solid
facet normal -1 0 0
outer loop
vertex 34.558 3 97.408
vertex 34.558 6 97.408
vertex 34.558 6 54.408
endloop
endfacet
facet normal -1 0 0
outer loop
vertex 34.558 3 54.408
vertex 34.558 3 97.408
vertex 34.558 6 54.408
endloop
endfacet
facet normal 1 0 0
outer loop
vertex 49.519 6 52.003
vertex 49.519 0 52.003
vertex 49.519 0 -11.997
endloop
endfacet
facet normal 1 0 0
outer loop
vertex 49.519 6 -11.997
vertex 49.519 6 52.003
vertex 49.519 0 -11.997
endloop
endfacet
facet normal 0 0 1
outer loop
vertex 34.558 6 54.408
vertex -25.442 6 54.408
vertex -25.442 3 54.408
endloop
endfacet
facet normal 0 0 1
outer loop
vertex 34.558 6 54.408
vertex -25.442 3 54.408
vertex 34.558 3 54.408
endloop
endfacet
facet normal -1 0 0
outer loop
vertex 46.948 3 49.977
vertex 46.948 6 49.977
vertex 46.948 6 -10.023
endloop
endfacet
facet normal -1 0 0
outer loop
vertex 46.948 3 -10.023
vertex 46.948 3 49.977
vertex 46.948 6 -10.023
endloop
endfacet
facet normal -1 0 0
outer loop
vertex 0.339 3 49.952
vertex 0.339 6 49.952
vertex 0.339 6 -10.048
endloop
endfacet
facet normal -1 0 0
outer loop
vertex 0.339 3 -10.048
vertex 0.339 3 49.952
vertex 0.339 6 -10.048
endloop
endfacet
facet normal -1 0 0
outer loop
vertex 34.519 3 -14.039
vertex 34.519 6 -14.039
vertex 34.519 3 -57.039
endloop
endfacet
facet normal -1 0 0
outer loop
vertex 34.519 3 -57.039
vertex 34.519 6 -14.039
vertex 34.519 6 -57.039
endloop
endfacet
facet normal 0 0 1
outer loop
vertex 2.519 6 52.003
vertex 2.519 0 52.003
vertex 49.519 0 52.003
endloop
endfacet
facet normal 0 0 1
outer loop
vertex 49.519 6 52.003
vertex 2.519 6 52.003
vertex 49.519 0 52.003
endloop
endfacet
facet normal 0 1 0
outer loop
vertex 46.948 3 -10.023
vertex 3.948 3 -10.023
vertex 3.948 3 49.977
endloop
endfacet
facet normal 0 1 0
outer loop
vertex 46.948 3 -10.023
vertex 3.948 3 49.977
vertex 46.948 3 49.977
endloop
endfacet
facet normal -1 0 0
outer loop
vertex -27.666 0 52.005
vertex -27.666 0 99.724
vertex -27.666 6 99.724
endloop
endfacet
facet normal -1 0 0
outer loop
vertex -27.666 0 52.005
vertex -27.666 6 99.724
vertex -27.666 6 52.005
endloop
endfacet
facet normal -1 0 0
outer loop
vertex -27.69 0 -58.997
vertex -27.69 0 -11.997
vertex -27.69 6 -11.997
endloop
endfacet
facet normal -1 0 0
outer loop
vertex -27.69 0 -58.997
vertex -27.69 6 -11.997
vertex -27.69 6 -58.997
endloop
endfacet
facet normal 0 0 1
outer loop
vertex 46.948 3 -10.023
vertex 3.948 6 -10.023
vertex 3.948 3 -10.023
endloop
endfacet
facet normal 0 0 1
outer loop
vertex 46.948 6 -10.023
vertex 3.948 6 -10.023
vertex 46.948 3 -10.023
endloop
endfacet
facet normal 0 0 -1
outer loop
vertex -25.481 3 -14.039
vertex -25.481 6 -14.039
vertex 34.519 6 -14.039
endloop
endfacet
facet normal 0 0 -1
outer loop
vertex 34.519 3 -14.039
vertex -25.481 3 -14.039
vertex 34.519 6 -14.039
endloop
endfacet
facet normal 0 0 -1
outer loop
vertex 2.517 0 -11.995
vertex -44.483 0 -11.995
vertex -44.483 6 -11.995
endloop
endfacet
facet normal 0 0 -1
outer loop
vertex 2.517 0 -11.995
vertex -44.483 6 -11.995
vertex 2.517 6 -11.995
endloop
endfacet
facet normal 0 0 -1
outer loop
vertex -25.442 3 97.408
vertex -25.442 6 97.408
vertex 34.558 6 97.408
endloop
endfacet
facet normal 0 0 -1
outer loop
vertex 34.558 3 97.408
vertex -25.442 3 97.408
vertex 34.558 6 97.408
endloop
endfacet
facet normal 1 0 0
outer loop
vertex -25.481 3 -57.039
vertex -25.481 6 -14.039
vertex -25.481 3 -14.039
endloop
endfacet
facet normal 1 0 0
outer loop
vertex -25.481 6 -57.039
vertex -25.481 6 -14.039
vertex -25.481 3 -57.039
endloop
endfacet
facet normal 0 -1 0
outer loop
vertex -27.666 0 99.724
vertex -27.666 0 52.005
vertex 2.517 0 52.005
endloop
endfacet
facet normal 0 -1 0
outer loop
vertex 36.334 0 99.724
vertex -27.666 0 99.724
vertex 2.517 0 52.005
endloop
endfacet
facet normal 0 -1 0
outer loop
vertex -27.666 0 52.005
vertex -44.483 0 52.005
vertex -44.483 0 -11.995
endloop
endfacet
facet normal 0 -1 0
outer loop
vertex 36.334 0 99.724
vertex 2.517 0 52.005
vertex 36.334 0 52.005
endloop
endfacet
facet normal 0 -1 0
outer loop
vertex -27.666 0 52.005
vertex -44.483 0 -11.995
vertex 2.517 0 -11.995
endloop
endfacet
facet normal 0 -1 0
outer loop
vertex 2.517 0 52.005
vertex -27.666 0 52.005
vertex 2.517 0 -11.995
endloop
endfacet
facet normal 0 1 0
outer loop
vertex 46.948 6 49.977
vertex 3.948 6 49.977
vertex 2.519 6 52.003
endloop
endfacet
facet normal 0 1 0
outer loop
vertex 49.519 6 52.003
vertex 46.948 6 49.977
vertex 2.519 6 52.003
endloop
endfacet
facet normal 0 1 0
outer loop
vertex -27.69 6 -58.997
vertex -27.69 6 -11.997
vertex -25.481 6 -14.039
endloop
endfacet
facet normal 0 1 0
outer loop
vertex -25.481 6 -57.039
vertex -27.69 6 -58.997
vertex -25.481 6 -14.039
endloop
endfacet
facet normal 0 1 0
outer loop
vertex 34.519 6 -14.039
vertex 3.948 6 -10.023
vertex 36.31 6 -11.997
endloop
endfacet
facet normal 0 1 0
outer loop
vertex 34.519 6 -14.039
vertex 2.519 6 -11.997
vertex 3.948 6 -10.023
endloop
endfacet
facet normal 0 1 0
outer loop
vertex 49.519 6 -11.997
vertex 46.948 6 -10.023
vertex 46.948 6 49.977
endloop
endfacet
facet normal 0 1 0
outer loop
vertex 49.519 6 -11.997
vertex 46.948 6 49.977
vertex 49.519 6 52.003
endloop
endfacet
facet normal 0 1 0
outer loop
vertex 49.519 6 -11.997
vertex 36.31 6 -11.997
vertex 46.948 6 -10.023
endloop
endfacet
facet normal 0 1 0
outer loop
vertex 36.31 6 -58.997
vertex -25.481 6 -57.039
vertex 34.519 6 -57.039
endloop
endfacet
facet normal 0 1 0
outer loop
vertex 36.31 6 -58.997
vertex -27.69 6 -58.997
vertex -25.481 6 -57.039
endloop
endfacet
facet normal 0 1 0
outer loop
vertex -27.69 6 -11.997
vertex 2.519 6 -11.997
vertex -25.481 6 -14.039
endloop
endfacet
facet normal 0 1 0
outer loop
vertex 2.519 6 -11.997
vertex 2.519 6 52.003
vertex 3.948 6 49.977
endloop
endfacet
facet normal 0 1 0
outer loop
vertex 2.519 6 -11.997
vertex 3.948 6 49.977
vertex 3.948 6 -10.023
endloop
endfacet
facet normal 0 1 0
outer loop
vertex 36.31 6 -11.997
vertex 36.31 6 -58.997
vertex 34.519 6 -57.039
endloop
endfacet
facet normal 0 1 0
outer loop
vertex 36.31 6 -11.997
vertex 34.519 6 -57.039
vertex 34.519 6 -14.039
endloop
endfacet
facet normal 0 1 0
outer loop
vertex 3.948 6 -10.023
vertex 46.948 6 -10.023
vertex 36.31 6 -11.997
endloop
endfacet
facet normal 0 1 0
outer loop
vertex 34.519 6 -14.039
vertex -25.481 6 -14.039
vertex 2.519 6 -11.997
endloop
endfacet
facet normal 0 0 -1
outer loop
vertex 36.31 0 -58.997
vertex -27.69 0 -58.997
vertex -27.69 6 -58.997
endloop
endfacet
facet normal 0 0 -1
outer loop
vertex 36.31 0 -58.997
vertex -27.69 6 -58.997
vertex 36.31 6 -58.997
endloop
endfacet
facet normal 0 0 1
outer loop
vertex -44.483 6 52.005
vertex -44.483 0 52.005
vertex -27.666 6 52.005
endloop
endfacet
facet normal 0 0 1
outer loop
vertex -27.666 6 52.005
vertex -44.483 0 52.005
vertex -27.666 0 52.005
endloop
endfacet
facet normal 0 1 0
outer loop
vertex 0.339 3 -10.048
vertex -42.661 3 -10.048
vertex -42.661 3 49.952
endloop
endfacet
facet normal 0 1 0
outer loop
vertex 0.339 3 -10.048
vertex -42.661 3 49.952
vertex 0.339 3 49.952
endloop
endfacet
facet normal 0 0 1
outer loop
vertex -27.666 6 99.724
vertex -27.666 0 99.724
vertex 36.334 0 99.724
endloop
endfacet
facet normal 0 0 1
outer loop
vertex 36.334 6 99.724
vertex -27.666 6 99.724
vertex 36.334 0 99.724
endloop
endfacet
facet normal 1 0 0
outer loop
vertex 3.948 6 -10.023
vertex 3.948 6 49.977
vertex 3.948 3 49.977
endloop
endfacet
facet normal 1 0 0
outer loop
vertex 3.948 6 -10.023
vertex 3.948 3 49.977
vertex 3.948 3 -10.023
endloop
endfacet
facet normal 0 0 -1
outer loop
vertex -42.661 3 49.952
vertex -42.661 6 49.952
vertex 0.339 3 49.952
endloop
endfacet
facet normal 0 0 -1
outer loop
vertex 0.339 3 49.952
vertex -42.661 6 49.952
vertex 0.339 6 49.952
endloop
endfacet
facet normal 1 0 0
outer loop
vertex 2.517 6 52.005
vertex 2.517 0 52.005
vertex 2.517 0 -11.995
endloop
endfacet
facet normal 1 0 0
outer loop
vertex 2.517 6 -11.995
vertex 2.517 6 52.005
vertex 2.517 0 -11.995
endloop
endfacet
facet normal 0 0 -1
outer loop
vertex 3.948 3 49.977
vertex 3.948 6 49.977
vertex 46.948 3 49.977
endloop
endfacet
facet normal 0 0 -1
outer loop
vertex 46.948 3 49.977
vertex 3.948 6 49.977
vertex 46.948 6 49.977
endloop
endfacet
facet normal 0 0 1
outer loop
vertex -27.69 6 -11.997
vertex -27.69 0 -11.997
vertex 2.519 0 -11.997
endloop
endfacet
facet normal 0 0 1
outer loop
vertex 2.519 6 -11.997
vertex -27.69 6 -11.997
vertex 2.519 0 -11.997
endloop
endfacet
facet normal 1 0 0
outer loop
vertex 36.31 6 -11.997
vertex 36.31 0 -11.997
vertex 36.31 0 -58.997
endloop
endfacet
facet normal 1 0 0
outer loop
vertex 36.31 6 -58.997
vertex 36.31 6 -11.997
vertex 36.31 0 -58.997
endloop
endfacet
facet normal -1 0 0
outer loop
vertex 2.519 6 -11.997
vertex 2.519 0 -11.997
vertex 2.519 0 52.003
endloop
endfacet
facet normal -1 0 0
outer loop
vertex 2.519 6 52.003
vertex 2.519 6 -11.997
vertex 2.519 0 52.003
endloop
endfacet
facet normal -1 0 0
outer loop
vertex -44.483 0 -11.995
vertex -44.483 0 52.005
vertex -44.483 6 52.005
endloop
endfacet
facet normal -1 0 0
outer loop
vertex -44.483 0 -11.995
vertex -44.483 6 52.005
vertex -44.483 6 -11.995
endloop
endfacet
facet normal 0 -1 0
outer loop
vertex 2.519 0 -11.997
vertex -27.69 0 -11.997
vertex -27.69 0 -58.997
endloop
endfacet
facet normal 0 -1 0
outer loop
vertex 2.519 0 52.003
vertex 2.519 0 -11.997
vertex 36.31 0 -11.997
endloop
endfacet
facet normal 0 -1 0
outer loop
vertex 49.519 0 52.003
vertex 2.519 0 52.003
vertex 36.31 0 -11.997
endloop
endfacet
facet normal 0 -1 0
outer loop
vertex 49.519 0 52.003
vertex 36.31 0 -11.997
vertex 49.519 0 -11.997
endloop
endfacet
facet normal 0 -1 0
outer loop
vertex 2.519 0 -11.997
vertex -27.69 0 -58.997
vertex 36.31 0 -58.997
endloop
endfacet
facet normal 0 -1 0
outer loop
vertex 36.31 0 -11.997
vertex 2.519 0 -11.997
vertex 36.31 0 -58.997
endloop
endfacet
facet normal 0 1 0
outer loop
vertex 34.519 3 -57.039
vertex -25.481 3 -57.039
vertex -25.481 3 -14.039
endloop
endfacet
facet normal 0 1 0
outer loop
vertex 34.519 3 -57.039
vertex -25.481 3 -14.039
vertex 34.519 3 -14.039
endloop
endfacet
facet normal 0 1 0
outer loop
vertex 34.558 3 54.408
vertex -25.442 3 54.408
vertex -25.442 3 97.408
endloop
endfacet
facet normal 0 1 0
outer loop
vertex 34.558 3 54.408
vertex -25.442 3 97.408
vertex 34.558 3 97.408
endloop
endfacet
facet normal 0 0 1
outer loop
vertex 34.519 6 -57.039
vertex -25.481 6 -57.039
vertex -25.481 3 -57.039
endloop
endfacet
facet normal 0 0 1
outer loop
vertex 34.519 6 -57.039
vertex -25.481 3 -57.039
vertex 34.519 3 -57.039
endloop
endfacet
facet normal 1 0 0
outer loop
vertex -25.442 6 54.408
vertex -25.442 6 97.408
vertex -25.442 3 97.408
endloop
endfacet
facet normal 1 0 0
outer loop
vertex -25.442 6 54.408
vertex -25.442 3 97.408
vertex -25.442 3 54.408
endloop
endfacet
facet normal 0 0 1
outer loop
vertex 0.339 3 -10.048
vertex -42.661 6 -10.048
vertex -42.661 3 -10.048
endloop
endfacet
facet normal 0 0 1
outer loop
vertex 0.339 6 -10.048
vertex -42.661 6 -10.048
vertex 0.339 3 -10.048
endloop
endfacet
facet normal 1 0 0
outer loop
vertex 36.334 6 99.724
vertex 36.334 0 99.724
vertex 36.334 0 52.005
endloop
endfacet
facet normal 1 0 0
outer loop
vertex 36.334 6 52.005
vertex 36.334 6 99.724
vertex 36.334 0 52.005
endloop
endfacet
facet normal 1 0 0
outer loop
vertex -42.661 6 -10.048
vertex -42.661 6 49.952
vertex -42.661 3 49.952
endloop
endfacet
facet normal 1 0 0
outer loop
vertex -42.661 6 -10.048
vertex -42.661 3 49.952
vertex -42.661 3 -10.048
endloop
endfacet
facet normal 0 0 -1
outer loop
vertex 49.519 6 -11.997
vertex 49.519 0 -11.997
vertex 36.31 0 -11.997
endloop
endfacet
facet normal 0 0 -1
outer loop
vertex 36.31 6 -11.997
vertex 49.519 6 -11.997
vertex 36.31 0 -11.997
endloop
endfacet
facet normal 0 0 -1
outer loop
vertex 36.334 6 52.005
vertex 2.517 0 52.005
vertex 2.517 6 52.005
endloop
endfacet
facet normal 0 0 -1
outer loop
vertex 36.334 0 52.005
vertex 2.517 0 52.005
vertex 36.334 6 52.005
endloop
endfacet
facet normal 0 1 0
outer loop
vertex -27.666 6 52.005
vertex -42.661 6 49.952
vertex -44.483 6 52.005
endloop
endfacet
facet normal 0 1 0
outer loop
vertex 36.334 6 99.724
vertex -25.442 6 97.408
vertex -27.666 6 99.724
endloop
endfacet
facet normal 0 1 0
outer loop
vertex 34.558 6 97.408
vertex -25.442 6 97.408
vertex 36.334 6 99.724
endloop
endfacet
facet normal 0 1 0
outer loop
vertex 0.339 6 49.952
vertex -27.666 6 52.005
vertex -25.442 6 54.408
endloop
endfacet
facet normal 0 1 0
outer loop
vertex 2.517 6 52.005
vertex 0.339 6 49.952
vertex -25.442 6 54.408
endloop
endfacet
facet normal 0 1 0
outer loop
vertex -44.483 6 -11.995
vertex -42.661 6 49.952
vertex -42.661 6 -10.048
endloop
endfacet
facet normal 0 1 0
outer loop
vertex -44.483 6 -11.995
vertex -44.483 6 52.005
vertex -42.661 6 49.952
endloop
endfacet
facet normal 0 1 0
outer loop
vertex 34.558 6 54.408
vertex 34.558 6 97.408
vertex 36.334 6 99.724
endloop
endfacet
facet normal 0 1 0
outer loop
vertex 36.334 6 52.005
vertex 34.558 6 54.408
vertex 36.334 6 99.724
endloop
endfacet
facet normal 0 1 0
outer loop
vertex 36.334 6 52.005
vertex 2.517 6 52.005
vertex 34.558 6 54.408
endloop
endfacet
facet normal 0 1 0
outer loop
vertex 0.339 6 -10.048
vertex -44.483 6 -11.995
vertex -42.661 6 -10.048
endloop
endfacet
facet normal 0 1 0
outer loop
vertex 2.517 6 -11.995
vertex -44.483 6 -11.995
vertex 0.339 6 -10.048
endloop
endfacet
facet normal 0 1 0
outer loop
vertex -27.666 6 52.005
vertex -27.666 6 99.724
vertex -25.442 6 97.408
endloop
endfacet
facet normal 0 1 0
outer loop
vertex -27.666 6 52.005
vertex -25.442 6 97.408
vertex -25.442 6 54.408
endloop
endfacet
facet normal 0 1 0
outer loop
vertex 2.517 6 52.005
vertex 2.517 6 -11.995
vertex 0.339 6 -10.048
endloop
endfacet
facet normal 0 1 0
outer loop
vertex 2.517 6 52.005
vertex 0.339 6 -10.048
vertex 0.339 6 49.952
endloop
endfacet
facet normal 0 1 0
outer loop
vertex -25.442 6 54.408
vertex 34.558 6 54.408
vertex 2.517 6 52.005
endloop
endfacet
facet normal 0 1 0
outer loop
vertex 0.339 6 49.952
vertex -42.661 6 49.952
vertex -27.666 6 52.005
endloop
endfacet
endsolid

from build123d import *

# Parameters (mm, degrees)
SKETCH_1_W          = 64
SKETCH_1_H          = 47
SKETCH_1_H_2        = 47.71926336
SKETCH_1_W_2        = 47
SKETCH_1_H_3        = 64
EXTRUDE_1_DEPTH     = 6
SKETCH_2_W          = 60
SKETCH_2_H          = 43
SKETCH_2_W_2        = 43
SKETCH_2_H_2        = 60
CUT_EXTRUDE_1_DEPTH = 3


with BuildPart() as part:
    # 草图1 → 凸台-拉伸1 (new body)
    with BuildSketch(Plane(origin=(0, 0, 0), x_dir=(1, 0, 0), z_dir=(0, 1, 0))):
        with Locations((4.310126327, 35.497193317)):
            Rectangle(SKETCH_1_W, SKETCH_1_H)
        Polygon((49.519053615, 11.997193317), (36.310126327, 11.997193317), (2.519053615, 11.997193317), (2.519053615, -52.002806683), (49.519053615, -52.002806683), align=None)
        with Locations((4.33350212, -75.864199044)):
            Rectangle(SKETCH_1_W, SKETCH_1_H_2)
        with Locations((-20.982571512, -20.004567364)):
            Rectangle(SKETCH_1_W_2, SKETCH_1_H_3)
    extrude(amount=EXTRUDE_1_DEPTH)

    # 草图2 → 切除-拉伸1 (cut)
    with BuildSketch(Plane(origin=(0, 6, 0), x_dir=(1, 0, 0), z_dir=(0, 1, 0))):
        with Locations((4.51896996, 35.538893407)):
            Rectangle(SKETCH_2_W, SKETCH_2_H)
        with Locations((4.558396391, -75.907591109)):
            Rectangle(SKETCH_2_W, SKETCH_2_H)
        with Locations((25.448357336, -19.977193446)):
            Rectangle(SKETCH_2_W_2, SKETCH_2_H_2)
        with Locations((-21.160835481, -19.952332993)):
            Rectangle(SKETCH_2_W_2, SKETCH_2_H_2)
    extrude(amount=-CUT_EXTRUDE_1_DEPTH, mode=Mode.SUBTRACT)


solid = part.part
